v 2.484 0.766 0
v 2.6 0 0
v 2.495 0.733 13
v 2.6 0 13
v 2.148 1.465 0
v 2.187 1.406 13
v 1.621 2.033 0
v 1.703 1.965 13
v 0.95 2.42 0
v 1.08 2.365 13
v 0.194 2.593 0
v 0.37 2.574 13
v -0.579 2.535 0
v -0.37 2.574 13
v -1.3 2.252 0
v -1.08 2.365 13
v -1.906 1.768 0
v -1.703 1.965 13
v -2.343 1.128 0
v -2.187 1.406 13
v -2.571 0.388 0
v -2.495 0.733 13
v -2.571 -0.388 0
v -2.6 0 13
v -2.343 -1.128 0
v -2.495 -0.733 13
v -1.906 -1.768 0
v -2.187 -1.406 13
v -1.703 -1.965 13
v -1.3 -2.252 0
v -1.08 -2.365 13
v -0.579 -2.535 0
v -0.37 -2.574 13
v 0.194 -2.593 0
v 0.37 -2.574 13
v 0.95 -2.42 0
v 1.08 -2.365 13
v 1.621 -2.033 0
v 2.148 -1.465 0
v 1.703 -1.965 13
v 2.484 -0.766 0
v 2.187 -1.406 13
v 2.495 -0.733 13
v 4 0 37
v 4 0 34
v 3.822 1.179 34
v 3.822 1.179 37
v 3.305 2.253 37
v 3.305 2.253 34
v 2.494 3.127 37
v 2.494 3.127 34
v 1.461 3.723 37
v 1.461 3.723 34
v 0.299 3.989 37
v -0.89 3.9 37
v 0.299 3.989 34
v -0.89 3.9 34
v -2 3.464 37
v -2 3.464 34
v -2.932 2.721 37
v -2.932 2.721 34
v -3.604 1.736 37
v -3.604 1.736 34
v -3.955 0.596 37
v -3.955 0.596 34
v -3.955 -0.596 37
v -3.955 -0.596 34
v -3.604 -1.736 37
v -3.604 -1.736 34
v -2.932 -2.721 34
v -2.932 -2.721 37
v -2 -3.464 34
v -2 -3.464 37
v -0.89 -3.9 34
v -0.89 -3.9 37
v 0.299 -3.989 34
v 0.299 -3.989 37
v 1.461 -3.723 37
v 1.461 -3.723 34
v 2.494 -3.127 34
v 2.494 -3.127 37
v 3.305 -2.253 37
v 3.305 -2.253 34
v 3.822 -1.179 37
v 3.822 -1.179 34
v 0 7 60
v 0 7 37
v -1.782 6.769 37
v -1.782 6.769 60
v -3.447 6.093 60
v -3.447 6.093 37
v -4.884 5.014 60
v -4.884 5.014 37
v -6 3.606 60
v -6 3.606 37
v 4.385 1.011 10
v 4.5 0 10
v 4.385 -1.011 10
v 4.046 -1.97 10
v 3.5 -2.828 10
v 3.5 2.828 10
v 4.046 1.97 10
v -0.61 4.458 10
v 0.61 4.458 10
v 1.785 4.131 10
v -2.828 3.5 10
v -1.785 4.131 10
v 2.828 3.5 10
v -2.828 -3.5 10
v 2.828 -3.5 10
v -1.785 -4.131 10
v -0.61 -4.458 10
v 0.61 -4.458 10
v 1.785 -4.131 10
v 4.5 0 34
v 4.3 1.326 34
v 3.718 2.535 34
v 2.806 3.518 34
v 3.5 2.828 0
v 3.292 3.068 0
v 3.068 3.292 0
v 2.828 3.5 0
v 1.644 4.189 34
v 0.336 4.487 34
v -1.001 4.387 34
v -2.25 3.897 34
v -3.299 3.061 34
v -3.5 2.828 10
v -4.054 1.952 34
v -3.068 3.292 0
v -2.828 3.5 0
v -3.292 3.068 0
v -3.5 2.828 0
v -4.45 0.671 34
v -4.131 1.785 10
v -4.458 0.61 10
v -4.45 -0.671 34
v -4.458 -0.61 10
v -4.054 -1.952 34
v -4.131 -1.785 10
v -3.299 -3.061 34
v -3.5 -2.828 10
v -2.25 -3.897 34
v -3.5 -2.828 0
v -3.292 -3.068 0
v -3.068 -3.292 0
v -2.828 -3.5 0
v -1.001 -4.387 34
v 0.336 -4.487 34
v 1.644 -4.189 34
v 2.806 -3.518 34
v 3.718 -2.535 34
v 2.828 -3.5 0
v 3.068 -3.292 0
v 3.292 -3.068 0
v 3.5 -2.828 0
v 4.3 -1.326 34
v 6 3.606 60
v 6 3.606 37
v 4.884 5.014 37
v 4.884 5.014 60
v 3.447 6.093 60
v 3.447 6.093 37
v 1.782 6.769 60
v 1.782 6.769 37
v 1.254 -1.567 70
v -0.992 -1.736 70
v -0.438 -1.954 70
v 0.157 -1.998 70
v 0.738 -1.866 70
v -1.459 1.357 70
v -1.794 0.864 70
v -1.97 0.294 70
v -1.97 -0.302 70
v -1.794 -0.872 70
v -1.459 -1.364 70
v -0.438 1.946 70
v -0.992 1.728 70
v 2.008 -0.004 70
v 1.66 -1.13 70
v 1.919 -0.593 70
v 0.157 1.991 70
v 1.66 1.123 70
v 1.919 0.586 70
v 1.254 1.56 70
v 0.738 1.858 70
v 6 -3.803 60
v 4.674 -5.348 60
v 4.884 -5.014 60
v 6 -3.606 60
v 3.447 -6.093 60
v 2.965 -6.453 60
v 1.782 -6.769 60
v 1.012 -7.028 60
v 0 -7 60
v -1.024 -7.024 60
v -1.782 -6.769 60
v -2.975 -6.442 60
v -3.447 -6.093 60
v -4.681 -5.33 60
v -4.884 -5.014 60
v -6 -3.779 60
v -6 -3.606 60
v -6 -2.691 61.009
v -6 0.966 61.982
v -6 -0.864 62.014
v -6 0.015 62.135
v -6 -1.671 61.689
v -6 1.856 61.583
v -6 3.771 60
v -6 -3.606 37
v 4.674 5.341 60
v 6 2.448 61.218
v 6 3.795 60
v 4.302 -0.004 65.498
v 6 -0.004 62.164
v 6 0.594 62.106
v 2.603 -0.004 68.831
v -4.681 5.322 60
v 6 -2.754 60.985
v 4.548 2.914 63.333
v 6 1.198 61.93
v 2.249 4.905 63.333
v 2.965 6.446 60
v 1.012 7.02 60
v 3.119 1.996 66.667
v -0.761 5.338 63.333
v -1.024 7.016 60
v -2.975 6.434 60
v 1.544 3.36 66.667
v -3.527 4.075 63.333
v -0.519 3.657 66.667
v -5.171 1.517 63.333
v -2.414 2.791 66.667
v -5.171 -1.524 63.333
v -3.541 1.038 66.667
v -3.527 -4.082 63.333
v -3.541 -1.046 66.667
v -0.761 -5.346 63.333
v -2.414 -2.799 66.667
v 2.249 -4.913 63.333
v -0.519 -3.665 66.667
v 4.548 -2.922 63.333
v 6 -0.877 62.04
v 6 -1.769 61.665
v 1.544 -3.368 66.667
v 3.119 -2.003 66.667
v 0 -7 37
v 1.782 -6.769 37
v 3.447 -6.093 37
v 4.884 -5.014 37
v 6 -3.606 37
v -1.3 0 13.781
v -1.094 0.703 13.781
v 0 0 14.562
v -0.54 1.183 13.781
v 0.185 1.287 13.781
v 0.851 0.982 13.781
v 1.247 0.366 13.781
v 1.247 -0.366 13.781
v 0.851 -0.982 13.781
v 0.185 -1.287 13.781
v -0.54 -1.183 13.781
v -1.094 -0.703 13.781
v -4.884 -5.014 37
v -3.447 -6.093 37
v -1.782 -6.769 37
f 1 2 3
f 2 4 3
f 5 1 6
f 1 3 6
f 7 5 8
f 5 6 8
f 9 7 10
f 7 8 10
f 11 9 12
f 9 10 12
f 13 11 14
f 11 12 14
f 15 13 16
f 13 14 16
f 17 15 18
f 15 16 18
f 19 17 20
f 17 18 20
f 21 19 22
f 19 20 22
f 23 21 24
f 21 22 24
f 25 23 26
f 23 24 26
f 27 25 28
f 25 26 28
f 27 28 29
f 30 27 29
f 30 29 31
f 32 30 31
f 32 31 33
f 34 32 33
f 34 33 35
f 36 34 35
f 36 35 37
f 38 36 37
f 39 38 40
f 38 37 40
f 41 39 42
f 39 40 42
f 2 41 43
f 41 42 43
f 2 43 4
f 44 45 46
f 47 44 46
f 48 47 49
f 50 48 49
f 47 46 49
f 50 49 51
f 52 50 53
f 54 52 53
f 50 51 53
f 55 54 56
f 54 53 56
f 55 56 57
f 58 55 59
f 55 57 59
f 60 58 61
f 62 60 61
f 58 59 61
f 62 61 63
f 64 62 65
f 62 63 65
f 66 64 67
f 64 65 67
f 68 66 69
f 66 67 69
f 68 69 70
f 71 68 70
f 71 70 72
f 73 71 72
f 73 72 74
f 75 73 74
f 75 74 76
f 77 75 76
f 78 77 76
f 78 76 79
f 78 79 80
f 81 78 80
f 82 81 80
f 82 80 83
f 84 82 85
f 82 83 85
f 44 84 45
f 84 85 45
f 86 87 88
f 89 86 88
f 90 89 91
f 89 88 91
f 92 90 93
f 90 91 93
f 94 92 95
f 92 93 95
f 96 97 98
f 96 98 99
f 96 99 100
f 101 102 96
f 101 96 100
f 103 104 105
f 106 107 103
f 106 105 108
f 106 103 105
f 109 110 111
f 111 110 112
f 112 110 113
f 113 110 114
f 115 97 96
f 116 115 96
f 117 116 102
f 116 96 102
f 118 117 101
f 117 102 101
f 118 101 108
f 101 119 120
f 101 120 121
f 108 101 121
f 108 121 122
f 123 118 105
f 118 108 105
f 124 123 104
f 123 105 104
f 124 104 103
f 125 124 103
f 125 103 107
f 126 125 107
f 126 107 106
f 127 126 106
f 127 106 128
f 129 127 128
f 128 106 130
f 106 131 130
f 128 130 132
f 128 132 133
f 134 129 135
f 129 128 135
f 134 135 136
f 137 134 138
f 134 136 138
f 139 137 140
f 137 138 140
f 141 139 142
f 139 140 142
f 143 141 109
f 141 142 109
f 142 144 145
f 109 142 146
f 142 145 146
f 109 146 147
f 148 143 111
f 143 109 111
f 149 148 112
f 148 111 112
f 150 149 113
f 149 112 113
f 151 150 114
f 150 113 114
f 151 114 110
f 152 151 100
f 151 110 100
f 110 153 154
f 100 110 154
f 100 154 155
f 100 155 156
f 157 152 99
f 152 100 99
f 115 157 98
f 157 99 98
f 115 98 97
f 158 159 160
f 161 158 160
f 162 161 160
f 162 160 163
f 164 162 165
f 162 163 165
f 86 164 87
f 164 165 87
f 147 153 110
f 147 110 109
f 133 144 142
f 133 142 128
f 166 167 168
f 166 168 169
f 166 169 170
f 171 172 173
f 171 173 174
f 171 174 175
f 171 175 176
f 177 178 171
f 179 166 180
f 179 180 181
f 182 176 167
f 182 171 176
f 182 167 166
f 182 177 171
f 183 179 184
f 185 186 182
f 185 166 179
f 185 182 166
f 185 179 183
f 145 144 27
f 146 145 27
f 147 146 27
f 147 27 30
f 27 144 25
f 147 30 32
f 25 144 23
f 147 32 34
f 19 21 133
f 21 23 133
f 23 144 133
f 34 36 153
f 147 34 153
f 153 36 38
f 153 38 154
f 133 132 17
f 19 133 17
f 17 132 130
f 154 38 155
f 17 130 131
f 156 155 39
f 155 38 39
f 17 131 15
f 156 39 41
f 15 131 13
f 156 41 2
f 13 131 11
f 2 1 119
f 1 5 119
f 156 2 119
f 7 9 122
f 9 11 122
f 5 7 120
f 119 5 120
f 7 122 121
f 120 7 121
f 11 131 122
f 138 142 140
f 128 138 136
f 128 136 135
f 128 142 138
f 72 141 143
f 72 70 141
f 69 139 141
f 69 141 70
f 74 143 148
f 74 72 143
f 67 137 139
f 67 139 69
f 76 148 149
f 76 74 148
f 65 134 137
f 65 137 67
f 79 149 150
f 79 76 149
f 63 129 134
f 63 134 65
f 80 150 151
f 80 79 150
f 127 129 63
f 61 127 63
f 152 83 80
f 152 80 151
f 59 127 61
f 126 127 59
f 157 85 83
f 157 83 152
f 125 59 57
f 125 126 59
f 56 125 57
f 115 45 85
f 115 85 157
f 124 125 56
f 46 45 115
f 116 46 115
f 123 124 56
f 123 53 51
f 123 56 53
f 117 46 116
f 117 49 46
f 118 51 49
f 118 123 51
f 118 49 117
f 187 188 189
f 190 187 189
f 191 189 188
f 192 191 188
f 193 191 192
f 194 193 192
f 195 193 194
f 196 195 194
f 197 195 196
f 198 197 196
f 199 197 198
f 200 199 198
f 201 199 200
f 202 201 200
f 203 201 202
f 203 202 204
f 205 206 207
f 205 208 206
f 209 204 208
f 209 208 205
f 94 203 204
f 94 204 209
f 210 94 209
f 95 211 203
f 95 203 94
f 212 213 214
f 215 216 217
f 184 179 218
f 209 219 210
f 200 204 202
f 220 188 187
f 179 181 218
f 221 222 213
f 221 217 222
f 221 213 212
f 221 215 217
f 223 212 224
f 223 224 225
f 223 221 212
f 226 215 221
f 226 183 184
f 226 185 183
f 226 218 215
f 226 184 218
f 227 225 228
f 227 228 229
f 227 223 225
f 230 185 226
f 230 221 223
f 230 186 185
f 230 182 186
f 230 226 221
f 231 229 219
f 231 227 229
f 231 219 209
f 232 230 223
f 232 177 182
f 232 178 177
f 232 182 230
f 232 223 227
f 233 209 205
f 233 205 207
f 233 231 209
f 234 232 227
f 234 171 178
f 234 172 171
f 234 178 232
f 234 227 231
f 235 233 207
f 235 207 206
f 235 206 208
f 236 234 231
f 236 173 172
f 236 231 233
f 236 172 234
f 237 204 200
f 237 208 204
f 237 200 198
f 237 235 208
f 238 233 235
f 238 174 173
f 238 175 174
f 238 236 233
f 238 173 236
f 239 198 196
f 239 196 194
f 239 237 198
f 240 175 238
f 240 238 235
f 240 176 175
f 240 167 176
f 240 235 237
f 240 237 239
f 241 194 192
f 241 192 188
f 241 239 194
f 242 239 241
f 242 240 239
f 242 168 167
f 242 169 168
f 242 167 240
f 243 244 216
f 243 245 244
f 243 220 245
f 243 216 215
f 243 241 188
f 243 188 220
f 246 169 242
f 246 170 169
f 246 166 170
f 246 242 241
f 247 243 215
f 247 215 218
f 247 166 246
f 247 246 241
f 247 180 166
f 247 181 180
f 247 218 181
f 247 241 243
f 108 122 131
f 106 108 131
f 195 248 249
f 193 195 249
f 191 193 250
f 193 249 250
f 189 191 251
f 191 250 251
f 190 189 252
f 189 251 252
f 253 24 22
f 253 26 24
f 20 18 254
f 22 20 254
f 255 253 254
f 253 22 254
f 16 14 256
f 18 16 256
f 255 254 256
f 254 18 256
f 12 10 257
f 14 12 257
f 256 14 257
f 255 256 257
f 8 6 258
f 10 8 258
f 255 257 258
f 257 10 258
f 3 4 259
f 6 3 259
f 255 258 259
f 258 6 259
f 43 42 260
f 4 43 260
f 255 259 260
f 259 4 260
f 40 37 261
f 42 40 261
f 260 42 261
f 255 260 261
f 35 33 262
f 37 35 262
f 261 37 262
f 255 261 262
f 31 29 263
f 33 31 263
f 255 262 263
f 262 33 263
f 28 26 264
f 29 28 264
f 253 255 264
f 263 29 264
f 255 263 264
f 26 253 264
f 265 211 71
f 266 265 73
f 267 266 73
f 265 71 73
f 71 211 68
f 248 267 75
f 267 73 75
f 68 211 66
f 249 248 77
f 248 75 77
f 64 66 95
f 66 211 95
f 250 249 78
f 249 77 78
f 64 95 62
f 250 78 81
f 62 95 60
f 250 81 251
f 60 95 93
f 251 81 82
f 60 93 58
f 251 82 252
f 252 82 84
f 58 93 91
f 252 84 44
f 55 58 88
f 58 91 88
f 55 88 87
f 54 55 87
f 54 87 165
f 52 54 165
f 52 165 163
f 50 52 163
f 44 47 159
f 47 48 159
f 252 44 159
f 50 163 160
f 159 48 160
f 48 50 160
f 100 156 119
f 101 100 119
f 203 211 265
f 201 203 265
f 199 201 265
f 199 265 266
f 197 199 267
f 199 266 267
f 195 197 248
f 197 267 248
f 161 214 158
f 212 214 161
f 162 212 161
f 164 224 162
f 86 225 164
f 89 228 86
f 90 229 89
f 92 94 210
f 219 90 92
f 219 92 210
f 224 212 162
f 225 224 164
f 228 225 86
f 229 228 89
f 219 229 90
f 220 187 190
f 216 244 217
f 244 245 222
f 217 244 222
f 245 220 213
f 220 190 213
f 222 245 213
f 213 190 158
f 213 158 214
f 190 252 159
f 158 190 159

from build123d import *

# Parameters (mm, degrees)
SKETCH_1_R            = 4.5
EXTRUDE_1_DEPTH       = 34
SKETCH_2_R            = 4
EXTRUDE_2_DEPTH       = 3
EXTRUDE_3_DEPTH       = 23
SKETCH_1_2_R          = 2
EXTRUDE_4_DEPTH       = 10
EXTRUDE_4_DRAFT       = 27
SKETCH_7_W            = 1.79623407
SKETCH_7_H            = 9.81557087
SKETCH_7_W_2          = 2.958566665
SKETCH_7_H_2          = 10.839995421
CUT_EXTRUDE_14_DEPTH  = 4
HOLE_WIZARD_M53_D     = 5.2
HOLE_WIZARD_M53_DEPTH = 13
HOLE_WIZARD_M53_TIP   = 1.562237609
SKETCH_16_R           = 10.346676453
SKETCH_16_W           = 7
SKETCH_16_H           = 7
CUT_EXTRUDE_15_DEPTH  = 10


with BuildPart() as part:
    # Эскиз1 → Бобышка-Вытянуть1 (new body)
    with BuildSketch(Plane.XY):
        Circle(SKETCH_1_R)
    extrude(amount=EXTRUDE_1_DEPTH)

    # Эскиз2 → Бобышка-Вытянуть2 (add)
    with BuildSketch(Plane.XY.offset(34)):
        Circle(SKETCH_2_R)
    extrude(amount=EXTRUDE_2_DEPTH)

    # Эскиз3 → Бобышка-Вытянуть3 (add)
    with BuildSketch(Plane.XY.offset(37)):
        with BuildLine():
            ThreePointArc((6, 3.605551275), (0, 7), (-6, 3.605551275))
            Line((-6, 3.605551275), (-6, -3.605551275))
            ThreePointArc((-6, -3.605551275), (0, -7), (6, -3.605551275))
            Line((6, -3.605551275), (6, 3.605551275))
        make_face()
    extrude(amount=EXTRUDE_3_DEPTH)


with BuildPart() as extrude_4_tool:
    # Sketch 1 2 → Бобышка-Вытянуть4 (with draft: the straight prism first)
    with BuildSketch(Plane(origin=(0.00751481, -0.003794932, 70), x_dir=(1, 0, 0), z_dir=(0, 0, 1))):
        Circle(SKETCH_1_2_R)
    extrude(amount=-EXTRUDE_4_DEPTH)
    # Бобышка-Вытянуть4: the draft: its side faces are tilted about the plane it starts from
    extrude_4_sides = [extrude_4_tool.faces().sort_by_distance(p)[0] for p in [
        (-1.99248519, -0.003794932, 65),
    ]]
    draft(extrude_4_sides, Plane(origin=(0.00751481, -0.003794932, 70), x_dir=(1, 0, 0), z_dir=(0, 0, 1)), EXTRUDE_4_DRAFT)


with BuildPart() as part_1:
    add(part.part)

    # Бобышка-Вытянуть4: add extrude_4_tool
    add(extrude_4_tool.part)

    # Эскиз7 → Вырез-Вытянуть14 (cut)
    with BuildSketch(Plane(origin=(0, 0, 60), x_dir=(-1, 0, 0), z_dir=(0, 0, -1))):
        with Locations((-6.898117035, 0.517903439)):
            Rectangle(SKETCH_7_W, SKETCH_7_H)
        with Locations((7.479283333, -1.183503448)):
            Rectangle(SKETCH_7_W_2, SKETCH_7_H_2)
    extrude(amount=-CUT_EXTRUDE_14_DEPTH, mode=Mode.SUBTRACT)

    # Сверло под метчик  спиральное M53
    with Locations(Plane(origin=(0, 0, 0), x_dir=(-1, 0, 0), z_dir=(0, 0, -1))):
        with Locations((0, 0)):
            Hole(HOLE_WIZARD_M53_D / 2, depth=HOLE_WIZARD_M53_DEPTH)
            with Locations((0, 0, -(HOLE_WIZARD_M53_DEPTH + HOLE_WIZARD_M53_TIP / 2))):  # 118° drill point
                Cone(0, HOLE_WIZARD_M53_D / 2, HOLE_WIZARD_M53_TIP, mode=Mode.SUBTRACT)

    # Эскиз16 → Вырез-Вытянуть15 (cut)
    with BuildSketch(Plane(origin=(0, 0, 0), x_dir=(-1, 0, 0), z_dir=(0, 0, -1))):
        Circle(SKETCH_16_R)
        Rectangle(SKETCH_16_W, SKETCH_16_H, mode=Mode.SUBTRACT)
    extrude(amount=-CUT_EXTRUDE_15_DEPTH, mode=Mode.SUBTRACT)


solid = part_1.part
